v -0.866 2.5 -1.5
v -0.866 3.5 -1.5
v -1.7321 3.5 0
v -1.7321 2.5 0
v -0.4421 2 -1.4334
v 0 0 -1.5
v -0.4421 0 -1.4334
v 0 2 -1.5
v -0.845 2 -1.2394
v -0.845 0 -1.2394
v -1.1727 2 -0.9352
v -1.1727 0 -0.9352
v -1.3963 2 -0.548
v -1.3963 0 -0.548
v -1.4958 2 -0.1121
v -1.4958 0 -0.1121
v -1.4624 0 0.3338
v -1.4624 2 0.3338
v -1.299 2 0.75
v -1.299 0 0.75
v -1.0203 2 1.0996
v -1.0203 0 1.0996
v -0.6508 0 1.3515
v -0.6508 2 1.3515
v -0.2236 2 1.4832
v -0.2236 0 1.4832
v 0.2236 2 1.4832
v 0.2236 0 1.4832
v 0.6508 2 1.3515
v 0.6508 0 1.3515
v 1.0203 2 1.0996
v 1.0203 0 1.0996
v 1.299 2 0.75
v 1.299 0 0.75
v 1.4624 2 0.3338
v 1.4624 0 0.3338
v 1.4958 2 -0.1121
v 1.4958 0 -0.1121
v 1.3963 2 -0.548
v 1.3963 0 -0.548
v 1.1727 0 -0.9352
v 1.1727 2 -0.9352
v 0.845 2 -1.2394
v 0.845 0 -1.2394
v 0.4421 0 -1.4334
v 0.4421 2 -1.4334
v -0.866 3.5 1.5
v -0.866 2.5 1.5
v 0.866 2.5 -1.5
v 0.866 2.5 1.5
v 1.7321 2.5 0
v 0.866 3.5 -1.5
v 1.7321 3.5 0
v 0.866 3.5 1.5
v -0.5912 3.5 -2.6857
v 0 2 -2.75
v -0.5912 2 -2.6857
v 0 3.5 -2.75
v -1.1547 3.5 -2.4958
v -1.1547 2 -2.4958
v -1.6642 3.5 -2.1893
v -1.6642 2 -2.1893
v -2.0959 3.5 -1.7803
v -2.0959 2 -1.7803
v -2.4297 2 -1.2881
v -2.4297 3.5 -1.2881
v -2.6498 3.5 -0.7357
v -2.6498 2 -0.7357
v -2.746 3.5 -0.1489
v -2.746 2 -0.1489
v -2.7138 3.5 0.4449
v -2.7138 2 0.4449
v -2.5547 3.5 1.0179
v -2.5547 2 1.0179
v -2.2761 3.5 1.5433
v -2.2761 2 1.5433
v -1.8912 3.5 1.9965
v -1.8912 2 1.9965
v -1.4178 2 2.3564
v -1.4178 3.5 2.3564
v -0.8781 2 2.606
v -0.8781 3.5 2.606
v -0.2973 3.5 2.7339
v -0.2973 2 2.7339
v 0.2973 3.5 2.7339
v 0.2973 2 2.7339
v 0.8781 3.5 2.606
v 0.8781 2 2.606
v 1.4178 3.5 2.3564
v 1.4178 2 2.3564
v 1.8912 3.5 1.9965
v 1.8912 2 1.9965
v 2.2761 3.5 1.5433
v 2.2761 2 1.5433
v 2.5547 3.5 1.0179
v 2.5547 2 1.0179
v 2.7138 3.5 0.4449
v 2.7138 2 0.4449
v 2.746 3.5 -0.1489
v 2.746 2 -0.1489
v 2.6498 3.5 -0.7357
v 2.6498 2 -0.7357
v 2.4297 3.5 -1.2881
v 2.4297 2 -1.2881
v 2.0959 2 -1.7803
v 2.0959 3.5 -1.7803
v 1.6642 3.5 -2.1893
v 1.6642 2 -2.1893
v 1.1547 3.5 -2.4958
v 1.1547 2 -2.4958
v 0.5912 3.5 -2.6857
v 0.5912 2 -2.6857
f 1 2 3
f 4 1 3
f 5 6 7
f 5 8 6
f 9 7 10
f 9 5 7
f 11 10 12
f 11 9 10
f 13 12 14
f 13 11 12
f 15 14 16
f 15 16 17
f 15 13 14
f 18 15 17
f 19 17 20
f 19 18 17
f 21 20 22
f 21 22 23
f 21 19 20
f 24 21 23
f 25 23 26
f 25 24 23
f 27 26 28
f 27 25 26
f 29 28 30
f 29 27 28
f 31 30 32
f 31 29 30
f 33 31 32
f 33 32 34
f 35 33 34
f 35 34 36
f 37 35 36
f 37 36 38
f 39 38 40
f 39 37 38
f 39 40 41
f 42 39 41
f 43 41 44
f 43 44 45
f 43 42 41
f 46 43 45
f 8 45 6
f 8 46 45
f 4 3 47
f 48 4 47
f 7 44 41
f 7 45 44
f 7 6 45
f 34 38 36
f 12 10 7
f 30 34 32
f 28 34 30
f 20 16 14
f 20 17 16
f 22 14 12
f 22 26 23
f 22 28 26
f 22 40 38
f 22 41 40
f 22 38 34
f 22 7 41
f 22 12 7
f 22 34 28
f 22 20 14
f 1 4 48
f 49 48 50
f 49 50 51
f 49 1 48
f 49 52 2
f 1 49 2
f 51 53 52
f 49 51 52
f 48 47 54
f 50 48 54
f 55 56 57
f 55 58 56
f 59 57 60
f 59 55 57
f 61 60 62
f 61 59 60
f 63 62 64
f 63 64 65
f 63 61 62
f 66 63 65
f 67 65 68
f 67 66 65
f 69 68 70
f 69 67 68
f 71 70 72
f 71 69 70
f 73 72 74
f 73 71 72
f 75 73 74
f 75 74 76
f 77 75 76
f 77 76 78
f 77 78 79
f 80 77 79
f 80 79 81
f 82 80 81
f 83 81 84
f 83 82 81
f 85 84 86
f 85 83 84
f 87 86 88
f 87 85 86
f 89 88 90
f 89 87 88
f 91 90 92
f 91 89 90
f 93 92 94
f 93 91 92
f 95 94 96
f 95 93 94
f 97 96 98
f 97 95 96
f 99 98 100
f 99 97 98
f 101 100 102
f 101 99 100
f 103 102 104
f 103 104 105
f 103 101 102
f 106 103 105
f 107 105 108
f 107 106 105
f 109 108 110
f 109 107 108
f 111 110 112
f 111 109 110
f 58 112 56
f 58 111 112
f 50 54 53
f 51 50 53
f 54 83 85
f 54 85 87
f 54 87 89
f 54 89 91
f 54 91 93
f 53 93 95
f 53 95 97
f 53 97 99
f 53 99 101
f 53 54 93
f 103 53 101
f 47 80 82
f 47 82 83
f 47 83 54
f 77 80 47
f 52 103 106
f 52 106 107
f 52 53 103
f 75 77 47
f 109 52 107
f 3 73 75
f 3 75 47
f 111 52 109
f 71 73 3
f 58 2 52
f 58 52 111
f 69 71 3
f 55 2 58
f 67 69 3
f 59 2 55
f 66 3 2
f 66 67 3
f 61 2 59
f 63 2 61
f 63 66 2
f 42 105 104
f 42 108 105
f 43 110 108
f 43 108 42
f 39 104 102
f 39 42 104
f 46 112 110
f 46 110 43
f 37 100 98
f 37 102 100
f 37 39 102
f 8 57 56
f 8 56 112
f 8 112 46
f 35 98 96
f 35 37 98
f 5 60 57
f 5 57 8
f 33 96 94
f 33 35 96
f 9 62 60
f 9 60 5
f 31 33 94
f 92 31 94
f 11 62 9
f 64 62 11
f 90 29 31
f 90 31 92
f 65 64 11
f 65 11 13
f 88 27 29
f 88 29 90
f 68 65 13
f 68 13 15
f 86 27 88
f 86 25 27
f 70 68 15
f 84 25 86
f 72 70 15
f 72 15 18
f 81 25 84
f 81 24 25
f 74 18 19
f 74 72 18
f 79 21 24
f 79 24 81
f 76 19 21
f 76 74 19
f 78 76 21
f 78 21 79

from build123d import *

# Parameters (mm, degrees)
SKETCH1_W          = 1.5
SKETCH1_H          = 2
CUT_EXTRUDE1_DEPTH = 1


with BuildPart() as part:
    # Sketch1 → Revolve1 (revolve)
    with BuildSketch(Plane.XY, mode=Mode.PRIVATE) as revolve1_sk:
        Polygon((0, 3.5), (0, 2), (1.5, 2), (2.75, 2), (2.75, 3.5), align=None)
        with Locations((0.75, 1)):
            Rectangle(SKETCH1_W, SKETCH1_H)
    revolve(revolve1_sk.sketch.rotate(Axis((0, 0, 0), (0, 1, 0)), 90), axis=Axis((0, 0, 0), (0, 1, 0)))

    # Sketch2 → Cut-Extrude1 (cut)
    with BuildSketch(Plane(origin=(0, 3.5, 0), x_dir=(1, 0, 0), z_dir=(0, 1, 0))):
        Polygon((-1.732050808, 0), (-0.866025404, -1.5), (0.866025404, -1.5), (1.732050808, 0), (0.866025404, 1.5), (-0.866025404, 1.5), align=None)
    extrude(amount=-CUT_EXTRUDE1_DEPTH, mode=Mode.SUBTRACT)


solid = part.part
